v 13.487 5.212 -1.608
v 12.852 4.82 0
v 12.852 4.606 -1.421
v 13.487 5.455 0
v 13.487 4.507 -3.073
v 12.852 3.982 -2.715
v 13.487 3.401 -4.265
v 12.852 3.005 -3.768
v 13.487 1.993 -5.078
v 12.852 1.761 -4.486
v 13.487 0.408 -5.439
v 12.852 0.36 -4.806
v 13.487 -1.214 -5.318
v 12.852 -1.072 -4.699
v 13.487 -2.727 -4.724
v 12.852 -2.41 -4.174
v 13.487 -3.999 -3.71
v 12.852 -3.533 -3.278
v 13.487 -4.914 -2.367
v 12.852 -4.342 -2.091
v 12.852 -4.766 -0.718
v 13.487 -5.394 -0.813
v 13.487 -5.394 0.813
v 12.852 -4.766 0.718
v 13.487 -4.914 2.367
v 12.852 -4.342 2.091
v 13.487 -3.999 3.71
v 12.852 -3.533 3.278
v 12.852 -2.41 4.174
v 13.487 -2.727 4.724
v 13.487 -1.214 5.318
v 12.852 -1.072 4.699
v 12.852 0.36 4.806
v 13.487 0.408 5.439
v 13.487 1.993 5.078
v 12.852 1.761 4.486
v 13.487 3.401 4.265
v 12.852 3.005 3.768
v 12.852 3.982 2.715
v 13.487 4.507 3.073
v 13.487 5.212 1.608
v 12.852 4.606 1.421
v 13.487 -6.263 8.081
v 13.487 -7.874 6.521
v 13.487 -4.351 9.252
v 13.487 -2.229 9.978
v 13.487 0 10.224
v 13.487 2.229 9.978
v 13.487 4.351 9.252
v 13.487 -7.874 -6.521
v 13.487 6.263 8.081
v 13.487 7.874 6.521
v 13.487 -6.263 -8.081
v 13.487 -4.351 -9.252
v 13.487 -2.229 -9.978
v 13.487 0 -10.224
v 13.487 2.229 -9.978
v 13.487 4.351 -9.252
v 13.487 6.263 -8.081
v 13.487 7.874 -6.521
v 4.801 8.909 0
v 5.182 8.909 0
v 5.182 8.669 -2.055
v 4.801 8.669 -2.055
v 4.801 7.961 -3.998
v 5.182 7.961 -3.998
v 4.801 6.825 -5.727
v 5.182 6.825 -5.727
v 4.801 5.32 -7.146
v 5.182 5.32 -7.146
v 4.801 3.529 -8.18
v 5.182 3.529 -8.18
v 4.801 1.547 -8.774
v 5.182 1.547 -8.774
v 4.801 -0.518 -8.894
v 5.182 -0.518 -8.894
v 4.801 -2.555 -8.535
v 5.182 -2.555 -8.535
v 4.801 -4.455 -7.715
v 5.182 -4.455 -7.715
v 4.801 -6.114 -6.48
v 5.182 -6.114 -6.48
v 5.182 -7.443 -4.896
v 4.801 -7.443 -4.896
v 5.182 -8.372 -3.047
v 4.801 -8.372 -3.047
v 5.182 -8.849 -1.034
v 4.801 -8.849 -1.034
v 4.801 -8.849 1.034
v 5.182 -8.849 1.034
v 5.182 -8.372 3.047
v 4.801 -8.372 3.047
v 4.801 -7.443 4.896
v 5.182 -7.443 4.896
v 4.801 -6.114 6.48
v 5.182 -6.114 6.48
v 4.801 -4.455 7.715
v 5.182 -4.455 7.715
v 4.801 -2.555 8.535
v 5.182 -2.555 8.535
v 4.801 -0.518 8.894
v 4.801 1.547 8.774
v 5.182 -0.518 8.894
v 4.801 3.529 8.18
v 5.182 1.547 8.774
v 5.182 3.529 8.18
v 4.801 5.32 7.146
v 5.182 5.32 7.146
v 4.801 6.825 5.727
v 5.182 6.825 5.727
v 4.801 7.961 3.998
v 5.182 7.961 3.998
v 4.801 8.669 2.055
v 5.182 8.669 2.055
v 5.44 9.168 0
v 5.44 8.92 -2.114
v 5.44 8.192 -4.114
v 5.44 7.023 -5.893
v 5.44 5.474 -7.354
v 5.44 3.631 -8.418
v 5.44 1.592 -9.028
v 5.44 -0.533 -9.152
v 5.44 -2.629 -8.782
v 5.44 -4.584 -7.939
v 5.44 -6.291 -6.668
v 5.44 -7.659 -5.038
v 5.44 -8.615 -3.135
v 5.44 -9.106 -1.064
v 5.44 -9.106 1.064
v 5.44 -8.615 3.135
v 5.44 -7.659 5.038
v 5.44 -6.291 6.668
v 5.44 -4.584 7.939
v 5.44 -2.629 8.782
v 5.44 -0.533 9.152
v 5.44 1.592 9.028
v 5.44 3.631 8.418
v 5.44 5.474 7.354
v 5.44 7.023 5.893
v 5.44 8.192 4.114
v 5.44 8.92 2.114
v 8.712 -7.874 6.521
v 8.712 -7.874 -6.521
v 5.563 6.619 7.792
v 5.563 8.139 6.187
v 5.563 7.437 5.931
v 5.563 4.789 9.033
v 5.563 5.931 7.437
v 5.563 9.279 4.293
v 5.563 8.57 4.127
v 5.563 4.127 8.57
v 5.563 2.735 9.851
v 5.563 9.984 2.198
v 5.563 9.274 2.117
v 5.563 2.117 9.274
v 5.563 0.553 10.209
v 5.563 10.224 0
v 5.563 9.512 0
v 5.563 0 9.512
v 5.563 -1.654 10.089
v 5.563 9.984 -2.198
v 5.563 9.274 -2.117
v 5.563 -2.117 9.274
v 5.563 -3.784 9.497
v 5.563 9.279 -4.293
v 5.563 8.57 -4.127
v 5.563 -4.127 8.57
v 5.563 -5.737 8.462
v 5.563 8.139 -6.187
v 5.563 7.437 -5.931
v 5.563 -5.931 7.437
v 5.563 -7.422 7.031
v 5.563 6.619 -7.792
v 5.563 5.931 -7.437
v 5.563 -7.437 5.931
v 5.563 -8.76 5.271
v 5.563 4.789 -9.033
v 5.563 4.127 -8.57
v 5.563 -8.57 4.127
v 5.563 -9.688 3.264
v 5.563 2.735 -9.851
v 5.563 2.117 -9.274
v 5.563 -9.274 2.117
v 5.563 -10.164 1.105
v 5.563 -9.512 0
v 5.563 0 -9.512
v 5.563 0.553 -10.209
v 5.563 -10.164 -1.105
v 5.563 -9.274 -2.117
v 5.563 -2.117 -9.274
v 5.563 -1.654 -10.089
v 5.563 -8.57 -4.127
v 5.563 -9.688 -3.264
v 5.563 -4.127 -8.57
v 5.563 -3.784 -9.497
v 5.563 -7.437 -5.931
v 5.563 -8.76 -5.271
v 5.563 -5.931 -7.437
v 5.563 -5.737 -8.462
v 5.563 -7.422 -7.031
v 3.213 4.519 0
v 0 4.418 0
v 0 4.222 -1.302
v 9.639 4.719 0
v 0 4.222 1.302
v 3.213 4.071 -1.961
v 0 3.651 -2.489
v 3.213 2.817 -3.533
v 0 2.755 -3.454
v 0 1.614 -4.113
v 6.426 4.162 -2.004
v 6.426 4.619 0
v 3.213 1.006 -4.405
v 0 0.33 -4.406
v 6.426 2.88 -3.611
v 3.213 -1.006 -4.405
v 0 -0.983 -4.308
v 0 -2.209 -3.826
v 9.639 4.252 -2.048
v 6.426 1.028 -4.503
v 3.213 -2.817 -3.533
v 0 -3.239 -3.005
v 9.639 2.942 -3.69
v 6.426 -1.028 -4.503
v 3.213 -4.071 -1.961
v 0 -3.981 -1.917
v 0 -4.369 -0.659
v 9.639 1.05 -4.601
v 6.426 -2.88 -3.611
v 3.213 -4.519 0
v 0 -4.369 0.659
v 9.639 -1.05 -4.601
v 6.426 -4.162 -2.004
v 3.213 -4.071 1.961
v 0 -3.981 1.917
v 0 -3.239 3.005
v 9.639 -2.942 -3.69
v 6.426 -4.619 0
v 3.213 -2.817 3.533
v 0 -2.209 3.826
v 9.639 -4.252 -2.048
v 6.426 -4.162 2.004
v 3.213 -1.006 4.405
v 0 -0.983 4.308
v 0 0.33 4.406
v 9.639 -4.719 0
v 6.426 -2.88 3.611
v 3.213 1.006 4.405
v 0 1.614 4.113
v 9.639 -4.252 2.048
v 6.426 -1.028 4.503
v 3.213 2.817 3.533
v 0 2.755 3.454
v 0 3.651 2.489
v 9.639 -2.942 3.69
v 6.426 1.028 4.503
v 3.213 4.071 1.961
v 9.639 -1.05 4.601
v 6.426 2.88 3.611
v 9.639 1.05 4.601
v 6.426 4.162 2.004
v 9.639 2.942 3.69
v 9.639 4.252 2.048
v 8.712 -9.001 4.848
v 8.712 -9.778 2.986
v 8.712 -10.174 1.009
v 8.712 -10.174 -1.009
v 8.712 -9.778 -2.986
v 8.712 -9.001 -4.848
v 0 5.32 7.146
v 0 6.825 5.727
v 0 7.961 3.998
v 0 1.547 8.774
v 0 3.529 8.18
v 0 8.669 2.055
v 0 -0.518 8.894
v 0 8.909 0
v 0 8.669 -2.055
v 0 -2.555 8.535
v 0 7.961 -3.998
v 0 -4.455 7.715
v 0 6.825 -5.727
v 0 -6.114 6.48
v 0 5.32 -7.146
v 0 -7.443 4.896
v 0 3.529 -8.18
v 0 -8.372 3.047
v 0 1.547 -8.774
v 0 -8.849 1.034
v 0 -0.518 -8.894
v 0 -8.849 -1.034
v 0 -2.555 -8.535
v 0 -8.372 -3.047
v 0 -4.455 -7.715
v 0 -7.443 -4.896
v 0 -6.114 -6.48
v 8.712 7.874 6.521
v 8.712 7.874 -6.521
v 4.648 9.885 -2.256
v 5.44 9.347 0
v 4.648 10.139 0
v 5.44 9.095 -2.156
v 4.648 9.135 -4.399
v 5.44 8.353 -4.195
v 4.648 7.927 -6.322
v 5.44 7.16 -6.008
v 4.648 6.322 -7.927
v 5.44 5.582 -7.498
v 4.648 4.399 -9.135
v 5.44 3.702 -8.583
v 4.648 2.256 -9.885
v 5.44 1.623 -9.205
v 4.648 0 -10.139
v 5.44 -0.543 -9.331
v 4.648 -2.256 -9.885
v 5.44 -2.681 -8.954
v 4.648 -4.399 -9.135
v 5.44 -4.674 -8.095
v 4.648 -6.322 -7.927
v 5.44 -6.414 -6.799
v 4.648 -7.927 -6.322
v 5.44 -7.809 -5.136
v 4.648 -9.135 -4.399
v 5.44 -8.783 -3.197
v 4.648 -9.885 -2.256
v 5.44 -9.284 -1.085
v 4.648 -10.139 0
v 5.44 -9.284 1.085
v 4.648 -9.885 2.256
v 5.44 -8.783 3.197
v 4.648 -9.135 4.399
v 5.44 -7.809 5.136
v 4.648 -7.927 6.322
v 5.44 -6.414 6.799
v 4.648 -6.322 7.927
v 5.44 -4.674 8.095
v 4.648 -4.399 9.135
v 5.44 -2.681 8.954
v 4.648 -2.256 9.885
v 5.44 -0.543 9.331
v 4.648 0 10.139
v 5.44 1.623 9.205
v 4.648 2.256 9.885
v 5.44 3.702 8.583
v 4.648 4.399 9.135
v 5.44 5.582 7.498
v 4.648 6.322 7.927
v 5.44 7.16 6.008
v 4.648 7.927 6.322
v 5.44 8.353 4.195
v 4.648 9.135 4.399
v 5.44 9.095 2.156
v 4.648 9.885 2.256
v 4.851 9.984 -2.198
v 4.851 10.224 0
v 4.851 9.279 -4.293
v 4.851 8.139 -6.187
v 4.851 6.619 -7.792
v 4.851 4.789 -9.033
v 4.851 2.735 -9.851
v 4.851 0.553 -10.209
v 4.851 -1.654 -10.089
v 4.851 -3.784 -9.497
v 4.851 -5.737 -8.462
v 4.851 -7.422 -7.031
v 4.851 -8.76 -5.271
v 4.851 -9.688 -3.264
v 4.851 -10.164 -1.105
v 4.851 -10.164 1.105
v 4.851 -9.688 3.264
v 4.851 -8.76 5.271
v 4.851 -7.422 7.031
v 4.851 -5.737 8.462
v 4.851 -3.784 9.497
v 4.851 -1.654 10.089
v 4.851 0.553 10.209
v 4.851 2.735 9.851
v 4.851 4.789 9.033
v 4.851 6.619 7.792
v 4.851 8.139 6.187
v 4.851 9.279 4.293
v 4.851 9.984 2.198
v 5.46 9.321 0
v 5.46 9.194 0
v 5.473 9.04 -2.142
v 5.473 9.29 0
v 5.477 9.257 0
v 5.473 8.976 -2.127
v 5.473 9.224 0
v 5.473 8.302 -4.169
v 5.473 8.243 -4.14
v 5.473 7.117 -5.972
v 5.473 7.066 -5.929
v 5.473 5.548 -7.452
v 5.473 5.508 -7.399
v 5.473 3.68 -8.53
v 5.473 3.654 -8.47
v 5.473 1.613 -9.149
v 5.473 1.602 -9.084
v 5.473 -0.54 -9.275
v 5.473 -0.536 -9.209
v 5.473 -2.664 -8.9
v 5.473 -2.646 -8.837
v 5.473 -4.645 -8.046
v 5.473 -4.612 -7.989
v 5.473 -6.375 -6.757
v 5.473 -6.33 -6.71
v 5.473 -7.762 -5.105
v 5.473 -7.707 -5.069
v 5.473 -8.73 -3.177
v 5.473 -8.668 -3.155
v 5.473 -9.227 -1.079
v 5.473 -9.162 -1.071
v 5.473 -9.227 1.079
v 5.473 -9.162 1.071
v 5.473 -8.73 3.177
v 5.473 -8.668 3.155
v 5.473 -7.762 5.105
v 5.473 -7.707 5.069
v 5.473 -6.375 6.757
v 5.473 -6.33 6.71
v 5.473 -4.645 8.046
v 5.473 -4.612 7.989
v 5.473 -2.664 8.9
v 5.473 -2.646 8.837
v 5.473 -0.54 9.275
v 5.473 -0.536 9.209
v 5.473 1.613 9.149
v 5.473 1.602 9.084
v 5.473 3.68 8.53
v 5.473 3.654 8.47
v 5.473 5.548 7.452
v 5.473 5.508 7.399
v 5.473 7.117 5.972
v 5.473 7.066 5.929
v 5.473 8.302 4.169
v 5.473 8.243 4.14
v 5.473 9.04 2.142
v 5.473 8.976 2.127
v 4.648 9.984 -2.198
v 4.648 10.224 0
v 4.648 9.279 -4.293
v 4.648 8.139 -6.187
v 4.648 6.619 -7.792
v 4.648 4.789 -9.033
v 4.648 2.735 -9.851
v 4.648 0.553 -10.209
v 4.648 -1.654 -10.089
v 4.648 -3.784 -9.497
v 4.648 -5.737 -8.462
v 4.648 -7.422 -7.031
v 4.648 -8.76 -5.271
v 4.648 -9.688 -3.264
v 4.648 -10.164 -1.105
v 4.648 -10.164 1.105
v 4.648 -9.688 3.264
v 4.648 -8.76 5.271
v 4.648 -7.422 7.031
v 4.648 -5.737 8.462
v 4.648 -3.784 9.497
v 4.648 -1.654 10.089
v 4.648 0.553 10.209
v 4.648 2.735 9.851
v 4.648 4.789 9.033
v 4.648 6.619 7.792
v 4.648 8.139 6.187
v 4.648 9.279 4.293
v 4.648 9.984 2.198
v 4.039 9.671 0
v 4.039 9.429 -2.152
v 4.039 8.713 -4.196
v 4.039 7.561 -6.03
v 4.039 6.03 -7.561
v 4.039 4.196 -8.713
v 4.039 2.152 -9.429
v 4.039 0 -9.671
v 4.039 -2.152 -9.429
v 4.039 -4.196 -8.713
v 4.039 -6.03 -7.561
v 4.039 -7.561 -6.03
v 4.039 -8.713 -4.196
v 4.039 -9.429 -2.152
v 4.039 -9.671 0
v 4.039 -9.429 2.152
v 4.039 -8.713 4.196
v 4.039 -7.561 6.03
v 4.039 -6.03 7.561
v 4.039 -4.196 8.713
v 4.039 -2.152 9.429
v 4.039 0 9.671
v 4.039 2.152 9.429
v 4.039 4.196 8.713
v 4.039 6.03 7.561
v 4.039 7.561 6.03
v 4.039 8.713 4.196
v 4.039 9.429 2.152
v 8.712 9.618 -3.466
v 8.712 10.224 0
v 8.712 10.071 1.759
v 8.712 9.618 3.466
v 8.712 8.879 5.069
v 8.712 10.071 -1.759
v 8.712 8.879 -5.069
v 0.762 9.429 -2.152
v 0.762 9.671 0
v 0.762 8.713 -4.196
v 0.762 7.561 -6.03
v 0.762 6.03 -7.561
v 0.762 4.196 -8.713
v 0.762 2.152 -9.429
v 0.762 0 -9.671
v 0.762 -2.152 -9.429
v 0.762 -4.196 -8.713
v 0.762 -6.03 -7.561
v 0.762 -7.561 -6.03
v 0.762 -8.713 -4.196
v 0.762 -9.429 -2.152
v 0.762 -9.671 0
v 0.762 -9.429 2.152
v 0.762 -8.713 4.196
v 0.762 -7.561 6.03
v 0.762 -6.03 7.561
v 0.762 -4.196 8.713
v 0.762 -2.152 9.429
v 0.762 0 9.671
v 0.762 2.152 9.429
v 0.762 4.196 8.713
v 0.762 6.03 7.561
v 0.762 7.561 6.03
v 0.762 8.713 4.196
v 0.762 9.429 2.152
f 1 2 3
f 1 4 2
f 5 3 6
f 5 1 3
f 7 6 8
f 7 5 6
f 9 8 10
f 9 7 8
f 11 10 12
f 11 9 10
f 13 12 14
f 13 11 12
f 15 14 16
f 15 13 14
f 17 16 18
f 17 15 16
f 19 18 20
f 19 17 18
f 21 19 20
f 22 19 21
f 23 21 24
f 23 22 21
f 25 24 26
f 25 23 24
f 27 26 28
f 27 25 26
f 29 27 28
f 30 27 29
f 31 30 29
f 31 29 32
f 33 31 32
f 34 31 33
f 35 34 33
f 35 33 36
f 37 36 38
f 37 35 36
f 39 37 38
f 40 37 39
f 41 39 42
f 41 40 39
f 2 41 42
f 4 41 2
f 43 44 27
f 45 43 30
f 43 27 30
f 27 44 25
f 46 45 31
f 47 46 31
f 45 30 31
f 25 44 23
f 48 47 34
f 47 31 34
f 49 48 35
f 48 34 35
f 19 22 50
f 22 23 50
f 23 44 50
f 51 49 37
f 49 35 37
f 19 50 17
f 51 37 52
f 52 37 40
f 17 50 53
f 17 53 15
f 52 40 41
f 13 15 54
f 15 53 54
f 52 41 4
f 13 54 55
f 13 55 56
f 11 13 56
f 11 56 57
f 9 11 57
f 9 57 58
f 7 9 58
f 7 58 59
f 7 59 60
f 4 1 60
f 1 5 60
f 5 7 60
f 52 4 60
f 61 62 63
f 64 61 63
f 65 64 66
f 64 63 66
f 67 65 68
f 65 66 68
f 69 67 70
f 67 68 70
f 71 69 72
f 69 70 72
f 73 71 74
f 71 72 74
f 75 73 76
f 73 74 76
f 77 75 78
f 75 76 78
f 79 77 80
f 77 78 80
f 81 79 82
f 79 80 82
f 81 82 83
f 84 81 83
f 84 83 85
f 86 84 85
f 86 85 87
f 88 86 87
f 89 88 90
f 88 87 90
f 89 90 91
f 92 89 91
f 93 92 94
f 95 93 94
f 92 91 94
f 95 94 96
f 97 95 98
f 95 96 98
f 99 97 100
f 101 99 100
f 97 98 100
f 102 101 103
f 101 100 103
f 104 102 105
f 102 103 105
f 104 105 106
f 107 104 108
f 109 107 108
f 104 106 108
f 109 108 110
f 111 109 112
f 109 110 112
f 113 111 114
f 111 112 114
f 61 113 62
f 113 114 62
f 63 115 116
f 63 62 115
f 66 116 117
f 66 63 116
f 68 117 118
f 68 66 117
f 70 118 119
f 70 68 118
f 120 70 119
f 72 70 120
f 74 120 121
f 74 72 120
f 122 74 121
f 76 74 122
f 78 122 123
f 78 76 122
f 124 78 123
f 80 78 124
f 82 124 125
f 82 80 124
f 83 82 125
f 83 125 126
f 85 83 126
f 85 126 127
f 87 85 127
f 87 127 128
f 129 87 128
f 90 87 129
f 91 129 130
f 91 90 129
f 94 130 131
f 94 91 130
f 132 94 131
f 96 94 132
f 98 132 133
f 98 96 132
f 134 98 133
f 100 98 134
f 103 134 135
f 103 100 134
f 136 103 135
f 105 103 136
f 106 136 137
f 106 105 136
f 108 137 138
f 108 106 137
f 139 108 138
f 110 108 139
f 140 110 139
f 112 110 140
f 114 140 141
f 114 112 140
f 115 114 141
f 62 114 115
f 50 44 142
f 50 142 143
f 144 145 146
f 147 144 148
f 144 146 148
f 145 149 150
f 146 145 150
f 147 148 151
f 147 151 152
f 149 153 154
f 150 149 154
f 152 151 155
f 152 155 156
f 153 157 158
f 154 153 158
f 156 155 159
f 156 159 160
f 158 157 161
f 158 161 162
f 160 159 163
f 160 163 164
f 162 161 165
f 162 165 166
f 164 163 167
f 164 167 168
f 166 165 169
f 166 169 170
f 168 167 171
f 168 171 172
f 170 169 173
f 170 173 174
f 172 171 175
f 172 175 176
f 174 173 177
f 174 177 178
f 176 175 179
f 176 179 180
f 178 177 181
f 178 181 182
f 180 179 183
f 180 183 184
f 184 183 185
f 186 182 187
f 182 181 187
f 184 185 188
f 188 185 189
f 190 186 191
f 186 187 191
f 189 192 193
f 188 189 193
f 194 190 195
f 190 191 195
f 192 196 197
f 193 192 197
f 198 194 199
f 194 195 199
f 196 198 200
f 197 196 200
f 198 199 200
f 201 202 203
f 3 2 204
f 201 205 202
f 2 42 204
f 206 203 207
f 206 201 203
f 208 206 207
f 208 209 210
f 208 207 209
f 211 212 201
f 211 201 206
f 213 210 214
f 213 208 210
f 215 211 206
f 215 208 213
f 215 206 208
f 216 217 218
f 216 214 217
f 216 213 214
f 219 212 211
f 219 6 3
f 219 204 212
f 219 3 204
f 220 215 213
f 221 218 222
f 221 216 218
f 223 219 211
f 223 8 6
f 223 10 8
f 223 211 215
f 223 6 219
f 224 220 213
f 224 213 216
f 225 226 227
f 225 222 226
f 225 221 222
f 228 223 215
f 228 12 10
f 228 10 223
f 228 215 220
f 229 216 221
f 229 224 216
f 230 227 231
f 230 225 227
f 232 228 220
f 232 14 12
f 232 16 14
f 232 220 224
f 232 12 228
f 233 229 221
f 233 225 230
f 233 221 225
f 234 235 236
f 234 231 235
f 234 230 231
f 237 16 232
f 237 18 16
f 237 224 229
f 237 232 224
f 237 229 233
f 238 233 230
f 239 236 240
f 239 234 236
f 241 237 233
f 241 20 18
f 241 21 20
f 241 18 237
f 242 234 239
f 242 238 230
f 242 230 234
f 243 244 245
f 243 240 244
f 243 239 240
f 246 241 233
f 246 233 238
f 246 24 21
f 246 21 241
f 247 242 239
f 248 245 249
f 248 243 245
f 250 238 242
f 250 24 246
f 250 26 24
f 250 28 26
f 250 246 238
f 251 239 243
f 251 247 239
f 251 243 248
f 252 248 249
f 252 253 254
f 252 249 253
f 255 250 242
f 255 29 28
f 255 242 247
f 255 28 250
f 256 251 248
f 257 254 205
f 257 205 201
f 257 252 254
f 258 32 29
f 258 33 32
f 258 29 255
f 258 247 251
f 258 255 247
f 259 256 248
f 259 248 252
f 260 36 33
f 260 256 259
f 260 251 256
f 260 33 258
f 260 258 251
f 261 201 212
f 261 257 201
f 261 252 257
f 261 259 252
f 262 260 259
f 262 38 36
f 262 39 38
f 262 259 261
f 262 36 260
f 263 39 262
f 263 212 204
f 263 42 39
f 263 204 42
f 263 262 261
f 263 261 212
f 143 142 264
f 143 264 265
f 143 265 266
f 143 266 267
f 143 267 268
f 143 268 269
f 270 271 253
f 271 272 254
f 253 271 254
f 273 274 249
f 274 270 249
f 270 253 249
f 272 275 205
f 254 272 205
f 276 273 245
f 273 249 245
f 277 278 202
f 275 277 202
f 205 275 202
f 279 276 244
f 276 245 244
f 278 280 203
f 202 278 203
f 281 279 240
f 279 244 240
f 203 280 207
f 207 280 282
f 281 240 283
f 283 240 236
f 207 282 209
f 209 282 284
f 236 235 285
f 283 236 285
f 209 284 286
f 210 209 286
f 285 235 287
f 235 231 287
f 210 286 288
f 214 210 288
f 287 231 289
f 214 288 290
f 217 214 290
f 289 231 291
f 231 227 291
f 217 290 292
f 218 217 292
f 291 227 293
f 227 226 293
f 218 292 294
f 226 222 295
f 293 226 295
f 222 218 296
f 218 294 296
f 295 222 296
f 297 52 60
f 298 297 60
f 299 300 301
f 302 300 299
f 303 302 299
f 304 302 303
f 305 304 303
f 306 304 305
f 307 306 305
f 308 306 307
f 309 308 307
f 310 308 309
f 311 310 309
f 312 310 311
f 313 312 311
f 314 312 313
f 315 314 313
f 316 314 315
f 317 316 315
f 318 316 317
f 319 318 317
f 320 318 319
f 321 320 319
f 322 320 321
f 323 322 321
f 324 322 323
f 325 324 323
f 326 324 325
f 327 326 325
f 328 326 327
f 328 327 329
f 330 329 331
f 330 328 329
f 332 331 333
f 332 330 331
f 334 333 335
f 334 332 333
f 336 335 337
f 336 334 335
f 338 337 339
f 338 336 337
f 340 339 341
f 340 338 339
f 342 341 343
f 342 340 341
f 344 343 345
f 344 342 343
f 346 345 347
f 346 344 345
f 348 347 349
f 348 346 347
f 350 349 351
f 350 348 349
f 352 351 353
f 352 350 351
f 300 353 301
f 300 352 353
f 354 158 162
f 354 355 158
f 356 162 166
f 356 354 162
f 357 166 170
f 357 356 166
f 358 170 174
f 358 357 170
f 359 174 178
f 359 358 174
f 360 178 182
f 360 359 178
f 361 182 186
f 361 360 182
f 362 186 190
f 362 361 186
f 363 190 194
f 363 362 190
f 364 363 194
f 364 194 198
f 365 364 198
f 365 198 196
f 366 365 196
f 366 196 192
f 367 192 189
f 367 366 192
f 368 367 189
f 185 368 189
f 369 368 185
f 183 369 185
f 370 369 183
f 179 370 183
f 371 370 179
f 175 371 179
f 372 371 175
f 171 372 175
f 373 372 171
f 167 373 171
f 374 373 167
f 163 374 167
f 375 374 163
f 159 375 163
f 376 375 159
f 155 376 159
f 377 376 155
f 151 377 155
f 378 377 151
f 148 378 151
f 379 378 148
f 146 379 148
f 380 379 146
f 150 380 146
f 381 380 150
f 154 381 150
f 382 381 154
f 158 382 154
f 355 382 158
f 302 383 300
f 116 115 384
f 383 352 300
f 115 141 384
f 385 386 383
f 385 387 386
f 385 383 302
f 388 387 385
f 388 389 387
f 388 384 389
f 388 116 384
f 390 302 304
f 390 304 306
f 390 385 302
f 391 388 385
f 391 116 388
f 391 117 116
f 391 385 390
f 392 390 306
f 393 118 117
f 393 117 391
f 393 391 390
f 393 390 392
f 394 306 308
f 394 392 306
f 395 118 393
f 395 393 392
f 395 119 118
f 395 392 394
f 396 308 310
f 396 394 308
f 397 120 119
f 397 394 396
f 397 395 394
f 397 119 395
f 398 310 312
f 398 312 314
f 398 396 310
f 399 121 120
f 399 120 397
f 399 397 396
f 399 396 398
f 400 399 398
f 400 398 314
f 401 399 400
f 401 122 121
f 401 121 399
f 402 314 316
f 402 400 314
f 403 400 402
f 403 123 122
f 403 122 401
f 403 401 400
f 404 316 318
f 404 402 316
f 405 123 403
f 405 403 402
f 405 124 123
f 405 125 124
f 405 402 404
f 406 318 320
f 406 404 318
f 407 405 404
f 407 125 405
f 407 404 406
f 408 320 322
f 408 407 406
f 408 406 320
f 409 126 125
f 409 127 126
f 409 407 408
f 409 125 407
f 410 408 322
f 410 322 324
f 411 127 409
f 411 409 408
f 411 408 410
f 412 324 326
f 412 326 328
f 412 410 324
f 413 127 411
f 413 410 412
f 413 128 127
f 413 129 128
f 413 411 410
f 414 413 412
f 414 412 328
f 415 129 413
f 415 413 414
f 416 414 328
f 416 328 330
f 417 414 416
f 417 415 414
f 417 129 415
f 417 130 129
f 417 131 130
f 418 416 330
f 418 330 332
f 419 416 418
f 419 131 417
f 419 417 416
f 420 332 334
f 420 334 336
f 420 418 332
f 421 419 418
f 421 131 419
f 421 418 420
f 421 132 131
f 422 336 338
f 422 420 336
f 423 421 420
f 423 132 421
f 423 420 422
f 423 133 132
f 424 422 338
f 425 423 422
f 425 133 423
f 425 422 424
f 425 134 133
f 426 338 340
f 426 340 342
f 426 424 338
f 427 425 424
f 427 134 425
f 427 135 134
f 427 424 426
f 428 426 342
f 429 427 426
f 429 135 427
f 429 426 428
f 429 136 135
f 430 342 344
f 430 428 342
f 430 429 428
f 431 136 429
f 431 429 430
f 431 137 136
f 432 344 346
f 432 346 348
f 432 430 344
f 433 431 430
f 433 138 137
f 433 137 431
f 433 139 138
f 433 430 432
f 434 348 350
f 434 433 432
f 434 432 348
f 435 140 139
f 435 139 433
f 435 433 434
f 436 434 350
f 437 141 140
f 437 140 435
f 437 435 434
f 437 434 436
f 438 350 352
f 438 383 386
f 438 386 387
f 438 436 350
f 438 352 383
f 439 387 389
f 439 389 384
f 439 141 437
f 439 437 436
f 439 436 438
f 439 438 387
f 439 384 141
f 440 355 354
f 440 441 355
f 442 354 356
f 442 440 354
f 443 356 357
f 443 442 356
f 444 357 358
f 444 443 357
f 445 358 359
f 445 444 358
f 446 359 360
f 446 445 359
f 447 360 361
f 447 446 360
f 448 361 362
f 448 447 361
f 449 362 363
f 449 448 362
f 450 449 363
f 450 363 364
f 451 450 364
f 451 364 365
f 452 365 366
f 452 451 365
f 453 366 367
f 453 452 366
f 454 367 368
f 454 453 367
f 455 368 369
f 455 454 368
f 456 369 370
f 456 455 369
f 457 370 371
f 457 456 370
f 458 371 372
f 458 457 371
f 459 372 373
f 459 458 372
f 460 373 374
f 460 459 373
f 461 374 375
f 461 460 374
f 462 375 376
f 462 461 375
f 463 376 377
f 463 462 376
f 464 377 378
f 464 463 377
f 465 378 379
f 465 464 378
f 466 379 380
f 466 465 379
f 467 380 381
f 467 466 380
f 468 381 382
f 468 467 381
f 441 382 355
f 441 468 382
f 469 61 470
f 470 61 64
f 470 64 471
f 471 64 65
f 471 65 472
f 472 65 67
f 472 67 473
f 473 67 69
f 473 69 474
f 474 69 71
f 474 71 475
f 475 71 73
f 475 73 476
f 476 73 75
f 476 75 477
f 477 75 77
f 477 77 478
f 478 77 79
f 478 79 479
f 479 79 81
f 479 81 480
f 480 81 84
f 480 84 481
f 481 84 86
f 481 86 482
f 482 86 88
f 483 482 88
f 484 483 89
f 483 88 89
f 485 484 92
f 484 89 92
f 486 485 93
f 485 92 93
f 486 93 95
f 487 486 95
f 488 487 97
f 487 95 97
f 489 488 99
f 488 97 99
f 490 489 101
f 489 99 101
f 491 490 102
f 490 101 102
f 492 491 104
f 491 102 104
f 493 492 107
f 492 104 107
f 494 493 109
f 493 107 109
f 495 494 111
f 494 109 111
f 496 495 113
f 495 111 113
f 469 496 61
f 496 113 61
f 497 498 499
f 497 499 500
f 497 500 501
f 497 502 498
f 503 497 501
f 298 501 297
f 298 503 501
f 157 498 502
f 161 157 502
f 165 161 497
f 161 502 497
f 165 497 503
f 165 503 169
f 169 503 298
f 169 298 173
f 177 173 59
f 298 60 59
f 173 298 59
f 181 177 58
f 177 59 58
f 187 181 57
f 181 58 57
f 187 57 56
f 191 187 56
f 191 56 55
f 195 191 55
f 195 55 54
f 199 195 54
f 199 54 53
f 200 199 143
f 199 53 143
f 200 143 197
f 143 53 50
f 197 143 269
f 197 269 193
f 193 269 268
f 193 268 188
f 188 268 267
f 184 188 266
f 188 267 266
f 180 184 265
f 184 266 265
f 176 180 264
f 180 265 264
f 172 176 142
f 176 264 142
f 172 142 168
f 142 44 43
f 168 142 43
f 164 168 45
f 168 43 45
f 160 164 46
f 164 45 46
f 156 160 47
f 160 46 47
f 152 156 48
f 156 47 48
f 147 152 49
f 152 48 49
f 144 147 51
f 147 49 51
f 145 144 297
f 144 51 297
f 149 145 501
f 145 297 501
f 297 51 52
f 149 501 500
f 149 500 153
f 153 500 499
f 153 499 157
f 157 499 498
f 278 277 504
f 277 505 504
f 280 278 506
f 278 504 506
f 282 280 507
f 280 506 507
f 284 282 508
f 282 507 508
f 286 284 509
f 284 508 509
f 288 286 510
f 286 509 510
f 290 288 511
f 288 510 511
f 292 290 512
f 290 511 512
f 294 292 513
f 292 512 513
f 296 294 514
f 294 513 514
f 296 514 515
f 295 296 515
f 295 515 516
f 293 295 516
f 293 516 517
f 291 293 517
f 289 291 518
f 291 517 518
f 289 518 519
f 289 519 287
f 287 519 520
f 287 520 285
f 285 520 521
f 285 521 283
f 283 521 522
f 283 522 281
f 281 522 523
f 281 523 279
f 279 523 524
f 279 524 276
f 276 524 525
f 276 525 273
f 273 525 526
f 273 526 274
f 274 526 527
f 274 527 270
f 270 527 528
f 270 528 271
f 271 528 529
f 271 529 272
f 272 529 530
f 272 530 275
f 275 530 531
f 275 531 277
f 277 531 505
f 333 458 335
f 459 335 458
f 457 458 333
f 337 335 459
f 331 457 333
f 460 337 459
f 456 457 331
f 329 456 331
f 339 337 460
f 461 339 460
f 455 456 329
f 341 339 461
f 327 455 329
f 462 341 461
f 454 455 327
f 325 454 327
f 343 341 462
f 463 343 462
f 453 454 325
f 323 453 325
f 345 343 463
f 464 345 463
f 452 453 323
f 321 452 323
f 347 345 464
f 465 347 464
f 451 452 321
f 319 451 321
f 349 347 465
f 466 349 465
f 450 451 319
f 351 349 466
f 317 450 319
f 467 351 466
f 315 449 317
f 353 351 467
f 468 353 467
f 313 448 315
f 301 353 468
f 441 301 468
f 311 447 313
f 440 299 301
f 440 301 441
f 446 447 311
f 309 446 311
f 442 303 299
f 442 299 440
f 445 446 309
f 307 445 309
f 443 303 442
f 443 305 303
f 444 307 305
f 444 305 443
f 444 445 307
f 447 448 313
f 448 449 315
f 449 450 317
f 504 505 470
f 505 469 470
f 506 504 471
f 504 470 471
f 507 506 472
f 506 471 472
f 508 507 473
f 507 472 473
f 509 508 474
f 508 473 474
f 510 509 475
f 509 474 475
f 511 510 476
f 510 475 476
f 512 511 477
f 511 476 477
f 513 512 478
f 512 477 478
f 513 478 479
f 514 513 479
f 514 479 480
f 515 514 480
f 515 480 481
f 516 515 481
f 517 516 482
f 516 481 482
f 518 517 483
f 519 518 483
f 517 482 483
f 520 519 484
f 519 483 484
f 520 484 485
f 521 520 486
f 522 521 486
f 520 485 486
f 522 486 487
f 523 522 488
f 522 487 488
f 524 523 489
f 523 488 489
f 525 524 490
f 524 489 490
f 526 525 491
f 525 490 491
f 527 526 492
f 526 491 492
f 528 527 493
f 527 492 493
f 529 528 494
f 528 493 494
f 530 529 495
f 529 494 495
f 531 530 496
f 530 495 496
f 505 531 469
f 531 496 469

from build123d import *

# Parameters (mm, degrees)
SKETCH3_W          = 81.788
SKETCH3_H          = 40.894
SKETCH3_W_2        = 40.894
SKETCH3_H_2        = 15.748
CUT_EXTRUDE1_DEPTH = 4.7752


with BuildPart() as part:
    # Sketch1 → Revolve1 (revolve)
    with BuildSketch(Plane.XY):
        Polygon((0, 0), (0, 8.90905), (0.762, 9.67105), (4.0386, 9.67105), (4.8006, 8.90905), (5.5626, 8.90905), (5.5626, 10.2235), (13.4874, 10.2235), (13.4874, 0), align=None)
    revolve(axis=Axis((13.4874, 0, 0), (-1, 0, 0)))

    # Sketch2 → Cut-Revolve1 (revolve, cut)
    with BuildSketch(Plane.XY):
        Polygon((0, 0), (0, 4.3688), (-1.588923892, 4.3688), (12.852387191, 4.819651116), (13.4874, 5.454663925), (13.4874, 0), align=None)
    revolve(axis=Axis((13.4874, 0, 0), (-1, 0, 0)), mode=Mode.SUBTRACT)

    # Sketch3 → Cut-Extrude1 (cut)
    with BuildSketch(Plane(origin=(13.4874, 0, 0), x_dir=(0, 0, -1), z_dir=(1, 0, 0))):
        Rectangle(SKETCH3_W, SKETCH3_H)
        Rectangle(SKETCH3_W_2, SKETCH3_H_2, mode=Mode.SUBTRACT)
    extrude(amount=-CUT_EXTRUDE1_DEPTH, mode=Mode.SUBTRACT)

    # Sketch4 → Revolve2 (revolve)
    with BuildSketch(Plane.XY):
        with BuildLine():
            Line((4.64794893, 10.2235), (4.64794893, 10.139331804))
            Line((4.64794893, 10.139331804), (5.440112806, 9.347167928))
            ThreePointArc((5.440112806, 9.347167928), (5.477310245, 9.257365367), (5.440112806, 9.167562806))
            Line((5.440112806, 9.167562806), (5.1816, 8.90905))
            Line((5.1816, 8.90905), (4.8006, 8.90905))
            Line((4.8006, 8.90905), (4.8006, 8.65505))
            Line((4.8006, 8.65505), (5.5626, 8.65505))
            Line((5.5626, 8.65505), (5.5626, 9.51204893))
            Line((5.5626, 9.51204893), (4.85114893, 10.2235))
            Line((4.85114893, 10.2235), (4.64794893, 10.2235))
        make_face()
    revolve(axis=Axis((5.5626, 0, 0), (-1, 0, 0)))


solid = part.part
